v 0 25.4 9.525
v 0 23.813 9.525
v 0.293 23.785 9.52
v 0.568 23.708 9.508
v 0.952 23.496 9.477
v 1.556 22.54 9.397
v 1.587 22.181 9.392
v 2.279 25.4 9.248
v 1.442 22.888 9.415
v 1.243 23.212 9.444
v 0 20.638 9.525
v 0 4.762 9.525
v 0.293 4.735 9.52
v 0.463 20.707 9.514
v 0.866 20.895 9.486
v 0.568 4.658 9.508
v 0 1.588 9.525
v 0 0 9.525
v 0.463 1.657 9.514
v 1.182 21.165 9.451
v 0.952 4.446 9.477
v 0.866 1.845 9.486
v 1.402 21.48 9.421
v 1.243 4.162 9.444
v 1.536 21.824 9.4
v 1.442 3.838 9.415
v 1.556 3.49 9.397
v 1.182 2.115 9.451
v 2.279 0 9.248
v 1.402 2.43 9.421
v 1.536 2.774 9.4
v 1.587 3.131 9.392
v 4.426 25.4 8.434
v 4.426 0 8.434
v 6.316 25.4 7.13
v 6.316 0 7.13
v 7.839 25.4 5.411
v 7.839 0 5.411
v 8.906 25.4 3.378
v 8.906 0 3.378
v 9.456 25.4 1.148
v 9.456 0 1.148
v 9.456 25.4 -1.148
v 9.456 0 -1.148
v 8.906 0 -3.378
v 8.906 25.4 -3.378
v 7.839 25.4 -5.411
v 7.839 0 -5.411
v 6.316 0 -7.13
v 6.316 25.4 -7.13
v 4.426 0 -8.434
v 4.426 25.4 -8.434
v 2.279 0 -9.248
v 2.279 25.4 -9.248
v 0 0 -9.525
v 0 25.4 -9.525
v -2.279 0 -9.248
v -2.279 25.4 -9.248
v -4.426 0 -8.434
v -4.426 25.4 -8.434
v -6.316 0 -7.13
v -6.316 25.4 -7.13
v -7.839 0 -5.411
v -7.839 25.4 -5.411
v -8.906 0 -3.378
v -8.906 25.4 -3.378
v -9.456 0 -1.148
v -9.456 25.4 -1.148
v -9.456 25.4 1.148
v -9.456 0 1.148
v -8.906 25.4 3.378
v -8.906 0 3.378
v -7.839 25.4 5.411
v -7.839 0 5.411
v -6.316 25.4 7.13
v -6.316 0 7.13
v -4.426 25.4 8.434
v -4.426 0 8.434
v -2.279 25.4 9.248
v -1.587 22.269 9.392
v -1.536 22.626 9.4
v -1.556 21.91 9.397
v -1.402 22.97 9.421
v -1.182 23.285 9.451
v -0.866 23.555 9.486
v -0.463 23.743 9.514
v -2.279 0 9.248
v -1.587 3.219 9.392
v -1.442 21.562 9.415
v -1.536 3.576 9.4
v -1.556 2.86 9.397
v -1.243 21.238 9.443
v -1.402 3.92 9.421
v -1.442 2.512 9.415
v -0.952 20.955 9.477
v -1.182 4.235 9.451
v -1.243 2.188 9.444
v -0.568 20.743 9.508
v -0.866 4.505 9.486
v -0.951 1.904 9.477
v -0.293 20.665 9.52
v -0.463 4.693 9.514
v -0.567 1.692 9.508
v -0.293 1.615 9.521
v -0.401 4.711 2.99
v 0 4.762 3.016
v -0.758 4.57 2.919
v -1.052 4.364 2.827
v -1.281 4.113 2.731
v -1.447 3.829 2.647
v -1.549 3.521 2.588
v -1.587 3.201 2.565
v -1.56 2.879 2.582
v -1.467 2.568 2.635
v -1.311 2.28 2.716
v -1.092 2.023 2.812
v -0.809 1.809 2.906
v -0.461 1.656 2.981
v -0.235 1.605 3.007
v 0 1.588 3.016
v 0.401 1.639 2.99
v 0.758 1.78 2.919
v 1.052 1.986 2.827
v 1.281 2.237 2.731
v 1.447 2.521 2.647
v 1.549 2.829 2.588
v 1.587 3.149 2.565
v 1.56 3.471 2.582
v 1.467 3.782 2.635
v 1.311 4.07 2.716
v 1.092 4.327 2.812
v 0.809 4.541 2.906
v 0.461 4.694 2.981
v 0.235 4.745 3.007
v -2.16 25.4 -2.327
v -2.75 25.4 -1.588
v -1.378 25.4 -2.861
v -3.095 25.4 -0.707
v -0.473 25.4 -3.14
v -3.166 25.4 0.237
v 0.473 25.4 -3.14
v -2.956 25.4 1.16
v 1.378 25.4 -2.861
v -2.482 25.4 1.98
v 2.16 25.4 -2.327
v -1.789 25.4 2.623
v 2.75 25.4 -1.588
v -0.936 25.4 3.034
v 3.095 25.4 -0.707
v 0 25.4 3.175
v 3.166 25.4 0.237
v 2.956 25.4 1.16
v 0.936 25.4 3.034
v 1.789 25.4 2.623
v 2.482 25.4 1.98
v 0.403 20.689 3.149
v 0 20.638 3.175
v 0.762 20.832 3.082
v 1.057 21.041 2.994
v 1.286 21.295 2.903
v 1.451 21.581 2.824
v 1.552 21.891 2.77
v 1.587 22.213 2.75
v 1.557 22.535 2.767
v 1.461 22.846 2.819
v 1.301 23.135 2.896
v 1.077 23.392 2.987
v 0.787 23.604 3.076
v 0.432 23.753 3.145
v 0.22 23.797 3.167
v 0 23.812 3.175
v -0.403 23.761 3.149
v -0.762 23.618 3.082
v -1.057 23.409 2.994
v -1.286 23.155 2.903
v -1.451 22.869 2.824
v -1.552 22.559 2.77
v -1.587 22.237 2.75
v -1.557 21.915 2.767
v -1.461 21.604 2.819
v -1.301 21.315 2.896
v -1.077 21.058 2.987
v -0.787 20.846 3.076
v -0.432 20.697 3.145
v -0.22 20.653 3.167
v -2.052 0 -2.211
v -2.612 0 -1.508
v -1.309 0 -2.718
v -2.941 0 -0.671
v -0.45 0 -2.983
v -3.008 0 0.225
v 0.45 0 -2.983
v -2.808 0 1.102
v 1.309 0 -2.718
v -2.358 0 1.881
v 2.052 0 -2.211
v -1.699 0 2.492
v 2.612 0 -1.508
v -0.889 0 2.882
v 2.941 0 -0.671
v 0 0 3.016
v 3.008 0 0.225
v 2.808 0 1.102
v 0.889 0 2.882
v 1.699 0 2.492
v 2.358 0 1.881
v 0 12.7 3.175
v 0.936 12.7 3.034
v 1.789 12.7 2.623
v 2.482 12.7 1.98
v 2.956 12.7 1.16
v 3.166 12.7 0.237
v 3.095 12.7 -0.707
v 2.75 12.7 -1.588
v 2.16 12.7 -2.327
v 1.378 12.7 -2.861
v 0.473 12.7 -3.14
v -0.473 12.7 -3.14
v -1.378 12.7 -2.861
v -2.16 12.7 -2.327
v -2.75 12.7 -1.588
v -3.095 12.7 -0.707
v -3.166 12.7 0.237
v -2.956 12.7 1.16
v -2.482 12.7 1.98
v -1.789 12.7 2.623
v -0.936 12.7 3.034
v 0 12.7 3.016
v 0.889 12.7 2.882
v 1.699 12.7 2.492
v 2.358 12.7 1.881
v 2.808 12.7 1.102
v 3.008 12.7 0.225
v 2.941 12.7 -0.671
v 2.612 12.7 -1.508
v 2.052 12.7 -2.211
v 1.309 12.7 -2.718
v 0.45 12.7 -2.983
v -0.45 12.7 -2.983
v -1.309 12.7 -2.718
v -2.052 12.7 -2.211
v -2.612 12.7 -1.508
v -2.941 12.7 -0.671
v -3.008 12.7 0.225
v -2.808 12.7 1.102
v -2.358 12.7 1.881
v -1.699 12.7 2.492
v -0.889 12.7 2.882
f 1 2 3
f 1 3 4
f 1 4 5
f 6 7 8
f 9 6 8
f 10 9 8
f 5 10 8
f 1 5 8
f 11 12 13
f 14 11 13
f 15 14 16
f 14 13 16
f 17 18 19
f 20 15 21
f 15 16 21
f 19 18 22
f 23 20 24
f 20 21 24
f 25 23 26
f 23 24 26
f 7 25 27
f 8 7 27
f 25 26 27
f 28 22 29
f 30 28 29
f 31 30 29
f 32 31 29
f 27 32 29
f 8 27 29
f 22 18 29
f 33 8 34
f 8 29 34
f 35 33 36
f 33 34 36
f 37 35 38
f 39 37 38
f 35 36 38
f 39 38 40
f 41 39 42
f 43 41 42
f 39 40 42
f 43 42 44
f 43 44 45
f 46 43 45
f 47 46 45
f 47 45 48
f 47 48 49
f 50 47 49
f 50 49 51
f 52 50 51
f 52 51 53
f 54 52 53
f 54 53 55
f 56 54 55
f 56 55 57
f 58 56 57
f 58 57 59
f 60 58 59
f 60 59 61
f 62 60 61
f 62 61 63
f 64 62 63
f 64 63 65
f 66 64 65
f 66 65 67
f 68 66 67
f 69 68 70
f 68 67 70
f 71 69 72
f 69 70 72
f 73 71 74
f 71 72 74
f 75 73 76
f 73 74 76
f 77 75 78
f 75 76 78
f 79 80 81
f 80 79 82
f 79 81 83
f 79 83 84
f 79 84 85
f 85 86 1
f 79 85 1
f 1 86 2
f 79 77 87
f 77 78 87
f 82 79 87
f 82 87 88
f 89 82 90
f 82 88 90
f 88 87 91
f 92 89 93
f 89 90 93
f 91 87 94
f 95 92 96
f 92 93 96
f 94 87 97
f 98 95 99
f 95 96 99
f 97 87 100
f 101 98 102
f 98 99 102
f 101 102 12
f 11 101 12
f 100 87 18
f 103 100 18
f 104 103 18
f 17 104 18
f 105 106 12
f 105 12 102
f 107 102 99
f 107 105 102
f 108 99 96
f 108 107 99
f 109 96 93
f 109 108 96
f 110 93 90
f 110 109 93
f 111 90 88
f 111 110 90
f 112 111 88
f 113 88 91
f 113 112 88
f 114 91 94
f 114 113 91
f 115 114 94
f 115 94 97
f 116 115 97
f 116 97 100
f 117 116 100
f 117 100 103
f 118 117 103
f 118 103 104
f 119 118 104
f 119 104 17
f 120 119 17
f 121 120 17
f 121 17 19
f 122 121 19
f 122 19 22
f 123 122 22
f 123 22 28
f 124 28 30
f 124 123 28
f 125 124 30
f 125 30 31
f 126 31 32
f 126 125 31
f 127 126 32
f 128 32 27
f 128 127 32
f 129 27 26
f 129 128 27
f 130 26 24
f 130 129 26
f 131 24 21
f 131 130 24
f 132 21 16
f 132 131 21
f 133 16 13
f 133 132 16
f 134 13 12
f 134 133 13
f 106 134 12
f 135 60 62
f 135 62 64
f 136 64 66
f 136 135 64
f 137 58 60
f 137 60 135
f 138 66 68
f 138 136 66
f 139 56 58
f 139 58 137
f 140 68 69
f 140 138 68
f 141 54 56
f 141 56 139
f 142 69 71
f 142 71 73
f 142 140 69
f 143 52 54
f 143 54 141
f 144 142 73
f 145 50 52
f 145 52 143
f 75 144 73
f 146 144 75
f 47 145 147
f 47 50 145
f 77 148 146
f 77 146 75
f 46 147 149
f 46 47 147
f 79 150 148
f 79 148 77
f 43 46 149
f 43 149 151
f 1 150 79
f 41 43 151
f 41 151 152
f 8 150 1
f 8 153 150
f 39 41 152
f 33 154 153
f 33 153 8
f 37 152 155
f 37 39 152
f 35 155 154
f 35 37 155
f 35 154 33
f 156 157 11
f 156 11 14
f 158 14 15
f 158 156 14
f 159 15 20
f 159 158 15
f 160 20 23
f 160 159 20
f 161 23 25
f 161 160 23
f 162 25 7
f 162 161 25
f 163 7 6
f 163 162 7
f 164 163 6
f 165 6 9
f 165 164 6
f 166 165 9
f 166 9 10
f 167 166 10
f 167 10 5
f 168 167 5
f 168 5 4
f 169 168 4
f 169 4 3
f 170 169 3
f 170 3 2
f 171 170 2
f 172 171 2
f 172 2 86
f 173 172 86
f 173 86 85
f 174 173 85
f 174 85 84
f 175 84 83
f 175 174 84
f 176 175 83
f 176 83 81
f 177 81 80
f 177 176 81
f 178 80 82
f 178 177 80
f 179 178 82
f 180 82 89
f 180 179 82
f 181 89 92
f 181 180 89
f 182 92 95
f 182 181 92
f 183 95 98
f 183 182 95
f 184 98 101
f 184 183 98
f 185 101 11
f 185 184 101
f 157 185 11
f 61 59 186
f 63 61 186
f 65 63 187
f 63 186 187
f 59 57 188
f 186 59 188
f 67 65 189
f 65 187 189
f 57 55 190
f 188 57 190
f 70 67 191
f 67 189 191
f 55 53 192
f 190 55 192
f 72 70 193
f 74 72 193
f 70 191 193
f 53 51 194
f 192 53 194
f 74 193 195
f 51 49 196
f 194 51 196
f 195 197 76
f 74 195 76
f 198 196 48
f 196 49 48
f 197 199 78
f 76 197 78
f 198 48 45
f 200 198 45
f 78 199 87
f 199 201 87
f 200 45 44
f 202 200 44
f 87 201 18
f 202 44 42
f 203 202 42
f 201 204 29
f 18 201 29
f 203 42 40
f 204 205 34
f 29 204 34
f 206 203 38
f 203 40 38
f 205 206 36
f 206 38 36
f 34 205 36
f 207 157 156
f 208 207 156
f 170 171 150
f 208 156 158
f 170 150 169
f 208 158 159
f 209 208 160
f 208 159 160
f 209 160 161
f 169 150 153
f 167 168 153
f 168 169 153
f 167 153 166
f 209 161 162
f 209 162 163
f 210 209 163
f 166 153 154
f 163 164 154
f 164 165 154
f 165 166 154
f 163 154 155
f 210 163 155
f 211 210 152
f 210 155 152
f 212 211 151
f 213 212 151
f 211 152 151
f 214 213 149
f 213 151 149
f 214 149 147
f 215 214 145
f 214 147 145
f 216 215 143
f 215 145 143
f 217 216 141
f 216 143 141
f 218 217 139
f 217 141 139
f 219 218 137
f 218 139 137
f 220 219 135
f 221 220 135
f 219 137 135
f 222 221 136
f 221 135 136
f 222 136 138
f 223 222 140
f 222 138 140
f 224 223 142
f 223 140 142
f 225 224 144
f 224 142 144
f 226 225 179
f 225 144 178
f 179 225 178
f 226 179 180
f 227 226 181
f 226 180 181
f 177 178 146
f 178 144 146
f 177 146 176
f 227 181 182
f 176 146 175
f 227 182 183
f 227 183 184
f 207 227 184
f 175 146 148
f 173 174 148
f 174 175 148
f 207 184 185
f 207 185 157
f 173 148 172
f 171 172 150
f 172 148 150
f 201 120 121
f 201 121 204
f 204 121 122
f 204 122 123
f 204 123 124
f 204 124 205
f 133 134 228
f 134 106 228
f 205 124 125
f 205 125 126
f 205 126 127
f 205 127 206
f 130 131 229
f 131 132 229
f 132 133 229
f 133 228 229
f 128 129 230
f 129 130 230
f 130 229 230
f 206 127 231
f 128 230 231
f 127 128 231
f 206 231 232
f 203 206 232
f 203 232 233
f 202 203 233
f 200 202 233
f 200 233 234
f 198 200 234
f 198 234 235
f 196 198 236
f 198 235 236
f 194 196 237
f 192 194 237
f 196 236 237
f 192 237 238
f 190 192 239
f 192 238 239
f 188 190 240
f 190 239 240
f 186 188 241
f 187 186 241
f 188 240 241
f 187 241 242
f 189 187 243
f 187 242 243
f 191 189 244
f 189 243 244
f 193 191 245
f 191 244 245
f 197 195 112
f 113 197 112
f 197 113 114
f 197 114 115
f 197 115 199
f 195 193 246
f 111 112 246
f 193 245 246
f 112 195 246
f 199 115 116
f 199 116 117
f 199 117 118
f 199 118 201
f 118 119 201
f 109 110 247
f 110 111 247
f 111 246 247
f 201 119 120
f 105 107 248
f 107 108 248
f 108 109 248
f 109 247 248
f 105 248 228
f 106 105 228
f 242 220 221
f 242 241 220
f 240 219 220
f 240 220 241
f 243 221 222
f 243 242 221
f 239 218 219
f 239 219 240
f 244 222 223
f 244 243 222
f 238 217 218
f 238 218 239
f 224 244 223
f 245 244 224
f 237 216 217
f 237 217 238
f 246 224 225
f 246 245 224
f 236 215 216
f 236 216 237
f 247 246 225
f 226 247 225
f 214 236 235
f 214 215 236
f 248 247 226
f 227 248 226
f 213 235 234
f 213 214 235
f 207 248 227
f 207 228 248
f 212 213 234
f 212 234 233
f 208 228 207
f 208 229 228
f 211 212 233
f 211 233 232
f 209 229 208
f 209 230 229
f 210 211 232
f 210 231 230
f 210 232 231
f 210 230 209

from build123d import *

# Parameters (mm, degrees)
SKETCH1_R           = 9.525
BOSS_EXTRUDE1_DEPTH = 25.4
SKETCH2_R           = 3.175
CUT_EXTRUDE1_DEPTH  = 12.7
SKETCH4_R           = 1.5875
CUT_EXTRUDE2_DEPTH  = 29.750847814
SKETCH5_R           = 3.01625
CUT_EXTRUDE3_DEPTH  = 19.513272438


with BuildPart() as part:
    # Sketch1 → Boss-Extrude1 (new body)
    with BuildSketch(Plane(origin=(0, 0, 0), x_dir=(1, 0, 0), z_dir=(0, 1, 0))):
        with Locations(Location((0, 0, 0), (0, 0, 270))):
            Circle(SKETCH1_R)
    extrude(amount=BOSS_EXTRUDE1_DEPTH)

    # Sketch2 → Cut-Extrude1 (cut)
    with BuildSketch(Plane(origin=(0, 25.4, 0), x_dir=(1, 0, 0), z_dir=(0, 1, 0))):
        with Locations(Location((0, 0, 0), (0, 0, 270))):
            Circle(SKETCH2_R)
    extrude(amount=-CUT_EXTRUDE1_DEPTH, mode=Mode.SUBTRACT)

    # Sketch4 → Cut-Extrude2 (cut, through all)
    with BuildSketch(Plane.XY):
        with Locations(Location((0, 22.225, 0), (0, 0, 270))):
            Circle(SKETCH4_R)
        with Locations(Location((0, 3.175, 0), (0, 0, 90))):
            Circle(SKETCH4_R)
    extrude(amount=CUT_EXTRUDE2_DEPTH, mode=Mode.SUBTRACT)

    # Sketch5 → Cut-Extrude3 (cut, through all)
    with BuildSketch(Plane(origin=(0, 12.7, 0), x_dir=(1, 0, 0), z_dir=(0, 1, 0))):
        with Locations(Location((0, 0, 0), (0, 0, 270))):
            Circle(SKETCH5_R)
    extrude(amount=-CUT_EXTRUDE3_DEPTH, mode=Mode.SUBTRACT)


solid = part.part
